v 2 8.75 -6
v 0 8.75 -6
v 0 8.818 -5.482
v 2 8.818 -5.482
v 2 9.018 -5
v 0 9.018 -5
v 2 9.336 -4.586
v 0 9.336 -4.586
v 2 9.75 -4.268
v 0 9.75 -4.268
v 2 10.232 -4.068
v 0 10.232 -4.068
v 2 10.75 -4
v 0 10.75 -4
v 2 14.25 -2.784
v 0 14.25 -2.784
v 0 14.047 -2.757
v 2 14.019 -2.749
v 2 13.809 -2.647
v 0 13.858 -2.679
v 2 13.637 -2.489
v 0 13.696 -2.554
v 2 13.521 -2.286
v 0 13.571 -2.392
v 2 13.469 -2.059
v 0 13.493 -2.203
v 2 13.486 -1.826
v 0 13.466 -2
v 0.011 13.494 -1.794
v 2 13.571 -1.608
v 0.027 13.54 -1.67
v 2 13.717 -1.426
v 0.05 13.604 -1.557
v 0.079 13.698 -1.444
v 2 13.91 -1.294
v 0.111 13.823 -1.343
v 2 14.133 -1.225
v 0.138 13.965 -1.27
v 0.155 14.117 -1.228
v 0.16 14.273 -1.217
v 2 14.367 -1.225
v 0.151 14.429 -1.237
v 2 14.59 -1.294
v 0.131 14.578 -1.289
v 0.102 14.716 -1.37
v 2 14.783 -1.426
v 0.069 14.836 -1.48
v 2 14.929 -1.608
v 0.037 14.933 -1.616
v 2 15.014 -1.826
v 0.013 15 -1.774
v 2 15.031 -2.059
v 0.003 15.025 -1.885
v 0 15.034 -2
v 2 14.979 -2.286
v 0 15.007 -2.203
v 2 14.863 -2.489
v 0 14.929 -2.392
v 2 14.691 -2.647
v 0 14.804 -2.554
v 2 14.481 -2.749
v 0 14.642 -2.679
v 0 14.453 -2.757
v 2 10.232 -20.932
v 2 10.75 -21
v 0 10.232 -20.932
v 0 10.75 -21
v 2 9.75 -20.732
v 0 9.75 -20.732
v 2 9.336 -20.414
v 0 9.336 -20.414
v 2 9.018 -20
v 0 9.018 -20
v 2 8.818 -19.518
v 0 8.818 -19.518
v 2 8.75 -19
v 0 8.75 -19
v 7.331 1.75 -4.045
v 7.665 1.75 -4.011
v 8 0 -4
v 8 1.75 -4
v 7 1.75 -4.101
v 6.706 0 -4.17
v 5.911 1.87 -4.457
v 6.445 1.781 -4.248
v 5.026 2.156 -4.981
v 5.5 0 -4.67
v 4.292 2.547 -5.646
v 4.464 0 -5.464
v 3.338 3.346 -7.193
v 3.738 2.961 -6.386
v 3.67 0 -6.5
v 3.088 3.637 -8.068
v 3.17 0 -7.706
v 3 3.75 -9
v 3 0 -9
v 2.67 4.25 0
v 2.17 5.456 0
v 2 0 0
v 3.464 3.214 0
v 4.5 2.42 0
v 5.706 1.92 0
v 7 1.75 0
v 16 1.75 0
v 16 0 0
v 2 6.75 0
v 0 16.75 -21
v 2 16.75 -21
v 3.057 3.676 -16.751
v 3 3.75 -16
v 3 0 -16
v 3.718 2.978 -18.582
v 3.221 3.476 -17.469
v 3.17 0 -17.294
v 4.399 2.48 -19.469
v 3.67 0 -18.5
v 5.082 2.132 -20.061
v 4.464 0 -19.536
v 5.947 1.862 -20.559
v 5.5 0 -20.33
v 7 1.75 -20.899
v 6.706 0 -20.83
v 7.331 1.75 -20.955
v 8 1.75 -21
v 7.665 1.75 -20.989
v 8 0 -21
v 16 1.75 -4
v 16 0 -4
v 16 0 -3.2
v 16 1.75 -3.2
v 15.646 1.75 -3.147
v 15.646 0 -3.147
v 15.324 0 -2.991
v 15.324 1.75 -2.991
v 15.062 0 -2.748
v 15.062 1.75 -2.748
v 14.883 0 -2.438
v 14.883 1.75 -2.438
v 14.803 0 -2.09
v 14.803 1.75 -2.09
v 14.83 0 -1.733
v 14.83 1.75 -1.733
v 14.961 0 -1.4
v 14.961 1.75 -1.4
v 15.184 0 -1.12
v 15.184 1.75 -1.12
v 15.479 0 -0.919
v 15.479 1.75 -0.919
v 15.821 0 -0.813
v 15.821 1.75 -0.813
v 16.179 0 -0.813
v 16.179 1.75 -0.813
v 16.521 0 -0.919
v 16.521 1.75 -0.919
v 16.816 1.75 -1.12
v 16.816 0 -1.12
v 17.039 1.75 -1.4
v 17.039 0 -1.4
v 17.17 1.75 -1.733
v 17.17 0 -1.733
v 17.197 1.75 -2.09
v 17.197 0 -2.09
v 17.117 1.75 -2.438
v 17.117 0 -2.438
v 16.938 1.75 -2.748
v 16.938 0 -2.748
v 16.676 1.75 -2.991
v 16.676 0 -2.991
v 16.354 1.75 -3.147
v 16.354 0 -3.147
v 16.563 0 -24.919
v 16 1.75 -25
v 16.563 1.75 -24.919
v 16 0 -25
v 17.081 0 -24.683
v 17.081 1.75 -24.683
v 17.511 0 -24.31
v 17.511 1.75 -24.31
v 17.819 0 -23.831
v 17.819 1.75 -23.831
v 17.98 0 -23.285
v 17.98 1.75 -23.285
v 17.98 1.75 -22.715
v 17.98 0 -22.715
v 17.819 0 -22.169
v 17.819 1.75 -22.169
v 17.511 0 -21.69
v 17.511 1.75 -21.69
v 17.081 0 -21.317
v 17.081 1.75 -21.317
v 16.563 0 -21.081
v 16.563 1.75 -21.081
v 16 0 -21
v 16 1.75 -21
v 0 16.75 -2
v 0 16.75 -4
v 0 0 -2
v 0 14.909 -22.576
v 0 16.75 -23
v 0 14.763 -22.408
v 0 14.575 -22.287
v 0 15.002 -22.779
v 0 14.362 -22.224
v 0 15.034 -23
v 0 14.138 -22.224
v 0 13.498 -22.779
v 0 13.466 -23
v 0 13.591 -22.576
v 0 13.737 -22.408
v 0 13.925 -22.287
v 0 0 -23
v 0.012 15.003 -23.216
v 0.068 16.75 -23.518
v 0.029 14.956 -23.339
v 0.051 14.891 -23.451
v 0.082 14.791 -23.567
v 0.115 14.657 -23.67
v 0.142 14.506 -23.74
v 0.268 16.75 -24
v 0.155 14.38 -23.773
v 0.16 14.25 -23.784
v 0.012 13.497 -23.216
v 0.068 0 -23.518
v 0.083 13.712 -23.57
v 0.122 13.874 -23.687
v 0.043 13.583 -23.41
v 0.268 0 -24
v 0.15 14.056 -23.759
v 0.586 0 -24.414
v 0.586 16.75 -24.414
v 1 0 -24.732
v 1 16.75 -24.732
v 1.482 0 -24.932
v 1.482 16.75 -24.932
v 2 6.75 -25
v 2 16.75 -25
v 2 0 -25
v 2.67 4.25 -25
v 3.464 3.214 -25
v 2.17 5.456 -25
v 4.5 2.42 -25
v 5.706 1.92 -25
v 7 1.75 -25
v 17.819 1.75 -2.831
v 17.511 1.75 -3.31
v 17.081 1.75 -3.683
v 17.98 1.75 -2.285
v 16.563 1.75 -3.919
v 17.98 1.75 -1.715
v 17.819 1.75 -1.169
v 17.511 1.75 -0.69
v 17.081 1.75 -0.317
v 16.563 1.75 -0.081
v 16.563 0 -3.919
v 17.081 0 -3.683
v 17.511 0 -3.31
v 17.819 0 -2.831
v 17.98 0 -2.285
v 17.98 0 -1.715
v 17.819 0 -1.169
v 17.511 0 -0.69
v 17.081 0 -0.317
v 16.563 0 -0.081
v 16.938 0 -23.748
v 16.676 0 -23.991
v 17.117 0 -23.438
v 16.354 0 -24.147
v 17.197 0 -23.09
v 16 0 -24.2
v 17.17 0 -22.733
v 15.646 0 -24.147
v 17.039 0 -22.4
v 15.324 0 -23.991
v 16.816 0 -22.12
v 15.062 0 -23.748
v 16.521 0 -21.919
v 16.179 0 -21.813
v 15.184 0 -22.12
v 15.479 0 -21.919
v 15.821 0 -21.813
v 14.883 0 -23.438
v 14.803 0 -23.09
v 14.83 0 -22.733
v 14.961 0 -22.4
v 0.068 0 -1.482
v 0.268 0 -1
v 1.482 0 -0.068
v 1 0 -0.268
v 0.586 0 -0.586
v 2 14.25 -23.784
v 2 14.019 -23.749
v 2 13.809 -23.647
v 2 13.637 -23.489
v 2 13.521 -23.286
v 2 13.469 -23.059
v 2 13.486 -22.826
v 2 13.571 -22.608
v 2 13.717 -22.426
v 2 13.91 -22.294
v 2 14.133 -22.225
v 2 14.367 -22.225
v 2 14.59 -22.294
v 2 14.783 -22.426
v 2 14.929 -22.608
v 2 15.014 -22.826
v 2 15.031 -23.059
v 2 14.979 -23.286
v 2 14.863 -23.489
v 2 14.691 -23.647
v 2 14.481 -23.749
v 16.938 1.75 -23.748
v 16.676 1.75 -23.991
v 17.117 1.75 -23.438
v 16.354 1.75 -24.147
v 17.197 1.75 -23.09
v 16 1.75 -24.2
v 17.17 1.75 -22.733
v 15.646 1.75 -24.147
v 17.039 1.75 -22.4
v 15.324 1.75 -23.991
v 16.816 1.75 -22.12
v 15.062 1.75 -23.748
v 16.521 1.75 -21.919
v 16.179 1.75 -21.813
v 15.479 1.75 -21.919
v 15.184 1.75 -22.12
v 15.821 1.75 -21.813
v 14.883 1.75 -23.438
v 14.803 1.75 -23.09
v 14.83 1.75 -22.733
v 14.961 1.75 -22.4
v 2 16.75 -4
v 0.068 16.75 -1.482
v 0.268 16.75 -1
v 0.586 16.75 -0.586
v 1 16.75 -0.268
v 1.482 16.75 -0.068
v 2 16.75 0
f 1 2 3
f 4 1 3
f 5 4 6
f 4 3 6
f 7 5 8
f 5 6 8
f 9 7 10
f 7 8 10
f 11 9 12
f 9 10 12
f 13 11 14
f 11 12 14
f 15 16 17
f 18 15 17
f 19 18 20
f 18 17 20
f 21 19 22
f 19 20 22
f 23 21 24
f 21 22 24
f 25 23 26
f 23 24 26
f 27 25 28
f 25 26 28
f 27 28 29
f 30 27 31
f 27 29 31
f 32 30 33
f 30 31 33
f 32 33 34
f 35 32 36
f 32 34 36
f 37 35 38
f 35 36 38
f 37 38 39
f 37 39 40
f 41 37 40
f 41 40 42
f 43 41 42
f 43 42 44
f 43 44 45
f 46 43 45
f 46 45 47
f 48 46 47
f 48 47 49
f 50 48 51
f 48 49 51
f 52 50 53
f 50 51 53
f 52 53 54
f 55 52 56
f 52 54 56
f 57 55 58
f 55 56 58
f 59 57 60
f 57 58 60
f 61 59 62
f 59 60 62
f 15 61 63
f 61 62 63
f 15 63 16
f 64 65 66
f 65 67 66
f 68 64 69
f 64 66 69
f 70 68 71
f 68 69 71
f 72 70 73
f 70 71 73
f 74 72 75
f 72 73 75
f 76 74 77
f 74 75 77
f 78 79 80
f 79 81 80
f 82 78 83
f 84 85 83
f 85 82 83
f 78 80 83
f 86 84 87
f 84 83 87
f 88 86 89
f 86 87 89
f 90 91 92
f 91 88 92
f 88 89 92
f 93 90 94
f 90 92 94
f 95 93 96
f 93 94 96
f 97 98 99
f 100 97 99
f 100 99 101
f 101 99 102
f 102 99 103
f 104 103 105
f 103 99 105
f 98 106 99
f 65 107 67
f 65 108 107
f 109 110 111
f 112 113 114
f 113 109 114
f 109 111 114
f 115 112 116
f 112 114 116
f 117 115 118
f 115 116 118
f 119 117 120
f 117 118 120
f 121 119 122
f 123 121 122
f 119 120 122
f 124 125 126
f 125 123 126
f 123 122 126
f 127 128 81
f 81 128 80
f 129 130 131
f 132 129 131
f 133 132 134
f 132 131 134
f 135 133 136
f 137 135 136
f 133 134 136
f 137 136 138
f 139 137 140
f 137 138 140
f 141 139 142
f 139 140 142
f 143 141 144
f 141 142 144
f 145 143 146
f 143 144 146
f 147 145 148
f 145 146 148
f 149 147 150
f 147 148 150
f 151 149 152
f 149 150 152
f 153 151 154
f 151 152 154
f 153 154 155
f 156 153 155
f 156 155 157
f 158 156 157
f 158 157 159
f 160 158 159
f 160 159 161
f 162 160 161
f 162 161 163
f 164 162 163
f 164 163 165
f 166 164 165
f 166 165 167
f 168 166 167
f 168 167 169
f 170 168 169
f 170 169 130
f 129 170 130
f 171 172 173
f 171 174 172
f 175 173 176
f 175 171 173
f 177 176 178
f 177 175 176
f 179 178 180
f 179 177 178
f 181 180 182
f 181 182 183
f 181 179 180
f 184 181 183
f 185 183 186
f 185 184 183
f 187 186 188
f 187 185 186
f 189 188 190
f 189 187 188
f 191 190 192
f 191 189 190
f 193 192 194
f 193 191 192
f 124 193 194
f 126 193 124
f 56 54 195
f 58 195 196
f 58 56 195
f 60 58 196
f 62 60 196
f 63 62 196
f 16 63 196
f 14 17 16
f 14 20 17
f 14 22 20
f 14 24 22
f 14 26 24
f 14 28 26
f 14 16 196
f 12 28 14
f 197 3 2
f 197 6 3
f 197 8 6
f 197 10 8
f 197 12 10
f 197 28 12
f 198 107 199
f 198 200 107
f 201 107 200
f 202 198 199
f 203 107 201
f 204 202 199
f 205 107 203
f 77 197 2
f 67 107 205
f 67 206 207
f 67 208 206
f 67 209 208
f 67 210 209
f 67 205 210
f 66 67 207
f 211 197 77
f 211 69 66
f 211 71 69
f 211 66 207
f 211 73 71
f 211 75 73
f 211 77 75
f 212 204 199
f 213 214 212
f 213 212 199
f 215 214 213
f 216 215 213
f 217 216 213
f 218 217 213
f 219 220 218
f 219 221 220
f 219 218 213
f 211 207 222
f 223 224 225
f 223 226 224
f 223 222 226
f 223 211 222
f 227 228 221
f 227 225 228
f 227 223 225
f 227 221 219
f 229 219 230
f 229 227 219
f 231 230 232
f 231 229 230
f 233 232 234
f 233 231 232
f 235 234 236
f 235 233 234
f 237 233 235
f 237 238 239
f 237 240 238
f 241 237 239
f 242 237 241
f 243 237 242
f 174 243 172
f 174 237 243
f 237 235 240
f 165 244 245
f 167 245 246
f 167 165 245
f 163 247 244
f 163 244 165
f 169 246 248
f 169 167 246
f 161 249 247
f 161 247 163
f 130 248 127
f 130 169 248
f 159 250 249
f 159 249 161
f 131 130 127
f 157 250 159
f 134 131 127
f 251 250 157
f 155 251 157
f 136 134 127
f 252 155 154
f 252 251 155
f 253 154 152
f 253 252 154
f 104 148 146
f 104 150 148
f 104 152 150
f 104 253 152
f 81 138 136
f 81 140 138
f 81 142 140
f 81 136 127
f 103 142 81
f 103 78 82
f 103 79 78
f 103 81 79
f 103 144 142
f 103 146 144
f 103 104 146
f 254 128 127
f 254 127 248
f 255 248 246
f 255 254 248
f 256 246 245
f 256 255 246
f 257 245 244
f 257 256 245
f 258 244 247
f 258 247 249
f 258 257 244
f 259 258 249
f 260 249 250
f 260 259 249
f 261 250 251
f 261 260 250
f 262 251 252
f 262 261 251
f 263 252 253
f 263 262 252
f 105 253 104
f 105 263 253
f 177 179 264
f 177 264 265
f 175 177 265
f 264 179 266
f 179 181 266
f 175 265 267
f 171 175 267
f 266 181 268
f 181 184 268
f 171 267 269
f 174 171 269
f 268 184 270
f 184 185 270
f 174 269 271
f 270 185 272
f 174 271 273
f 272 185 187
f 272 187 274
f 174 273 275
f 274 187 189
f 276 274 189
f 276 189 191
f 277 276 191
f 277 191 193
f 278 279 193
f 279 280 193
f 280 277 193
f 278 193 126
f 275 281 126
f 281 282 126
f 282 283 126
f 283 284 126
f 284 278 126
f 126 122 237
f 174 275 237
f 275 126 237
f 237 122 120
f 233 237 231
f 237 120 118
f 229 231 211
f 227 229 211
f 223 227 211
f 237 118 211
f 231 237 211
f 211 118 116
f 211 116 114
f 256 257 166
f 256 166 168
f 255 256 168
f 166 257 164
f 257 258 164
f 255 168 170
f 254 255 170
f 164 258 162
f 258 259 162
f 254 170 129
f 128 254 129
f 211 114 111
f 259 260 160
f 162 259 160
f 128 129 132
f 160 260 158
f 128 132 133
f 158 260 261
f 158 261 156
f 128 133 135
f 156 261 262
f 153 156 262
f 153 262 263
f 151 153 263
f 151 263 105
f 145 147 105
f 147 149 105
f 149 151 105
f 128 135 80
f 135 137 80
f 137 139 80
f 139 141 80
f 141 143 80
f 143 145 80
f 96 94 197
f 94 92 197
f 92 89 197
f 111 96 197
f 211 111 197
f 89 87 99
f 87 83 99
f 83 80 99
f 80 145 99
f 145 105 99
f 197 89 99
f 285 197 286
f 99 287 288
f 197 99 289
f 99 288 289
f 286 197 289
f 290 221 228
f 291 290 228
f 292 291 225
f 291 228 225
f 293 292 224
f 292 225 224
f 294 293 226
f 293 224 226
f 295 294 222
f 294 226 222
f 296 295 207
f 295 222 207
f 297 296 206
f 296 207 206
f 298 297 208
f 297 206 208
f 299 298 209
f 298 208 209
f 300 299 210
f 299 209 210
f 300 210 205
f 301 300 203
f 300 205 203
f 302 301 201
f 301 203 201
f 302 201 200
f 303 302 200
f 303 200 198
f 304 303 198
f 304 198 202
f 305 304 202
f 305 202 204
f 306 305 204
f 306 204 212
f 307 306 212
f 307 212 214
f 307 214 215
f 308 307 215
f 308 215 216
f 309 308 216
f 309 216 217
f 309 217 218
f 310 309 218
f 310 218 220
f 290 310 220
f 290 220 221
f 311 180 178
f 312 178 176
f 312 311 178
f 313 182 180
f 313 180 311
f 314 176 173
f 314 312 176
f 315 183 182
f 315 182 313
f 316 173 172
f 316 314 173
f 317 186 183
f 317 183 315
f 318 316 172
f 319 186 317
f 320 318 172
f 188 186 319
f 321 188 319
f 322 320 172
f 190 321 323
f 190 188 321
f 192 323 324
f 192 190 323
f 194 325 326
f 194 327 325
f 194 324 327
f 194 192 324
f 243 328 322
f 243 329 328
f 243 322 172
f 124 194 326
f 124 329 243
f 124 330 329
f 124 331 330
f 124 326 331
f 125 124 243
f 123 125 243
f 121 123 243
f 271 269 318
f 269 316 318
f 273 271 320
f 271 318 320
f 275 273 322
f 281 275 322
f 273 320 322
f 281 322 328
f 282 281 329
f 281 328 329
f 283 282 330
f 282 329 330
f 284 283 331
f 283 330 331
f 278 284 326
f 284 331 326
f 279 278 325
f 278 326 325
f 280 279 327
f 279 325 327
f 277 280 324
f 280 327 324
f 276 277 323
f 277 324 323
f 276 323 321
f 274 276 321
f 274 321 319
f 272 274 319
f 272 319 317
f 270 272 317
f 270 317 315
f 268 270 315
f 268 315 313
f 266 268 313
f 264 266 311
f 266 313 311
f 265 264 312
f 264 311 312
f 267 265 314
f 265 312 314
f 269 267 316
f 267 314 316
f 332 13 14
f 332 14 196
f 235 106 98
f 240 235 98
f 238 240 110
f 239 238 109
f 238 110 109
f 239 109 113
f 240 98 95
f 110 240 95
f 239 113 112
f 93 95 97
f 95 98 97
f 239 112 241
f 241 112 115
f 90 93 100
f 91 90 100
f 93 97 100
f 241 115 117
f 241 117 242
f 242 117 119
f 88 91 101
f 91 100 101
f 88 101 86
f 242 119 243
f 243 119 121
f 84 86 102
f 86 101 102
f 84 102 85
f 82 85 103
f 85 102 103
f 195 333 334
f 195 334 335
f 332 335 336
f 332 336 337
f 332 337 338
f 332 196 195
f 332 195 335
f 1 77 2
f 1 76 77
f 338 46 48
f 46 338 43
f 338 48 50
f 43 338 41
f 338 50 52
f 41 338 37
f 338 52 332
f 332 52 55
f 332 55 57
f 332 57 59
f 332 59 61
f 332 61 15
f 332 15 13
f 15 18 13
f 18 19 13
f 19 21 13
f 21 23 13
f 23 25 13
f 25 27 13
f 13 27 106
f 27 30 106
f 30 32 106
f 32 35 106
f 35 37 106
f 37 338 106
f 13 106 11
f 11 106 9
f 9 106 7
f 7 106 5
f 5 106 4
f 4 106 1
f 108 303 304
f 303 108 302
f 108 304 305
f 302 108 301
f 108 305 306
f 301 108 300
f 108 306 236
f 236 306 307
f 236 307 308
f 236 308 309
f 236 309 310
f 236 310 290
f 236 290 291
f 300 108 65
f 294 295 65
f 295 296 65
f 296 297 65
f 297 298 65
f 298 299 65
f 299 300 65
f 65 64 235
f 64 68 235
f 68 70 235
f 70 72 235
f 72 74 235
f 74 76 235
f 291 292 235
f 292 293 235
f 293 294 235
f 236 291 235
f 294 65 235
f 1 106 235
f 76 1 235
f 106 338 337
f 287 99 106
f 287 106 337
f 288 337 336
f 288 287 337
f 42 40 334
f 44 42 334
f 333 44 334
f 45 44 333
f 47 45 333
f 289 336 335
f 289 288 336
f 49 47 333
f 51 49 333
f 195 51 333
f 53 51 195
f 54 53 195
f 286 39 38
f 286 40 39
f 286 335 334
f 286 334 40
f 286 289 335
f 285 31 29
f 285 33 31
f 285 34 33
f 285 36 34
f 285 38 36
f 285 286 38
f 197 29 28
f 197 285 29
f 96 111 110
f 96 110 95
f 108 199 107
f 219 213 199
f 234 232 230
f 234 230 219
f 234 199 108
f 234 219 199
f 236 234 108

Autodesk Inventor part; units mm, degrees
ref_plane "YZ Plane" through (0, 0, 0) normal (1, 0, 0) x (0, 1, 0)
ref_plane "XZ Plane" through (0, 0, 0) normal (0, 1, 0) x (-1, 0, 0)
ref_plane "XY Plane" through (0, 0, 0) normal (0, 0, 1) x (1, 0, 0)
sketch "Sketch1" plane through (0, 0, 0) normal (0, 1, 0) x (-1, 0, 0)
  line L0 (0, 0) -> (0, 0)
  line L1 (0, -2) -> (0, -23)
  line L2 (0, -25) -> (-1.1394, -25)
  line L3 (-3, -16) -> (-3, -9)
  line L4 (-2, 0) -> (-16, 0)
  line L5 (-18, -2) -> (-18, -2)
  line L6 (-16, -4) -> (-8, -4)
  line L7 (-2, -25) -> (-16, -25)
  line L8 (-18, -23) -> (-18, -23)
  line L9 (-16, -21) -> (-8, -21)
  arc A0 (-3, -9) -> (-8, -4) centre (-8, -9) ccw
  arc A1 (-8, -21) -> (-3, -16) centre (-8, -16) ccw
  arc A2 (-16, 0) -> (-18, -2) centre (-16, -2) ccw
  arc A3 (-18, -2) -> (-16, -4) centre (-16, -2) ccw
  arc A4 (-16, -21) -> (-18, -23) centre (-16, -23) ccw
  arc A5 (-18, -23) -> (-16, -25) centre (-16, -23) ccw
  arc A6 (0, -2) -> (-2, 0) centre (-2, -2) ccw
  arc A7 (-2, -25) -> (0, -23) centre (-2, -23) ccw
  point P0 (-18, -21)
  point P1 (-18, -25)
  point P2 (-16, -2)
  point P3 (-16, -23)
  dimension "d0" = 3
  dimension "d2" = 4
  dimension "d3" = 2
  dimension "d4" = 2
  dimension "d5" = 2
  dimension "d6" = 2
  dimension "d7" = 4
  dimension "d8" = 21
  dimension "d9" = 15
  dimension "d10" = 0
  dimension "d11" = 5
  dimension "d12" = 2
extrude "Extrusion1" add sketch "Sketch1" along normal blind 1.75
sketch "Sketch2" plane through (0, 1.75, 0) normal (0, 1, 0) x (1, 0, 0)
  arc A0 (0, 2) -> (2, 0) centre (2, 2) ccw projected
  line L0 (0, 23) -> (0, 2) projected
  arc A1 (2, 25) -> (0, 23) centre (2, 23) ccw projected
  line L1 (2, 0) -> (2, 25)
  point P0 (0, 0)
extrude "Extrusion2" add sketch "Sketch2" along normal blind 15
hole "Hole1" at (16, 0, -2) at (16, 0, -23) direction (0, 1, 0) diameter 2.4 depth 6.3 tip angle 118 clearance for "Flat Head Machine Screw" size "M2" standard "Ansi Metric M Profile"
fillet "Fillet1" radius 5 1 edges at (2, 1.75, -12.5)
sketch "Sketch3" plane through (2, 16.75, 0) normal (1, 0, 0) x (0, 0, -1)
  line L0 (2, -2.5) -> (23, -2.5) construction
  line L1 (25, -10) -> (25, 0) projected
  line L2 (0, -10) -> (0, 0) projected
  line L3 (0, 0) -> (25, 0) projected
  point P0 (0, -16.75)
  dimension "d25" = 21
  dimension "d26" = 25
  dimension "d27" = 2
  dimension "d28" = 2.5
hole "Hole2" at (2, 14.25, -2) at (2, 14.25, -23) direction (-1, 0, 0) diameter 1.567 depth 6.3 tip angle 118 thread size "M2x0.4" class "6H" standard "ANSI Metric M Profile"
sketch "Sketch4" plane through (2, 16.75, 0) normal (1, 0, 0) x (0, 0, -1)
  line L0 (0, 0) -> (25, 0) projected
  line L1 (4, 0) -> (21, 0)
  line L2 (21, 0) -> (21, -8)
  line L3 (21, -8) -> (4, -8)
  line L4 (4, -8) -> (4, 0)
  line L5 (25, -10) -> (25, 0) projected
  line L6 (0, -10) -> (0, 0) projected
  point P0 (0, -16.75)
  dimension "d36" = 8
  dimension "d37" = 25
  dimension "d38" = 4
  dimension "d39" = 4
extrude "Extrusion3" cut sketch "Sketch4" against normal blind 10
fillet "Fillet2" radius 2 2 edges at (1, 8.75, -4) (1, 8.75, -21)
equation "\"d3\" = 0.5 * d2"
equation "\"d4\" = d3"
equation "\"d5\" = d3"
equation "\"d6\" = d4"
equation "\"d7\" = d2"
equation "\"d27\" = -0.5 * d25 + 0.5 * d26"
equation "\"d39\" = d38"
properties part number "pi_camera_mount"
